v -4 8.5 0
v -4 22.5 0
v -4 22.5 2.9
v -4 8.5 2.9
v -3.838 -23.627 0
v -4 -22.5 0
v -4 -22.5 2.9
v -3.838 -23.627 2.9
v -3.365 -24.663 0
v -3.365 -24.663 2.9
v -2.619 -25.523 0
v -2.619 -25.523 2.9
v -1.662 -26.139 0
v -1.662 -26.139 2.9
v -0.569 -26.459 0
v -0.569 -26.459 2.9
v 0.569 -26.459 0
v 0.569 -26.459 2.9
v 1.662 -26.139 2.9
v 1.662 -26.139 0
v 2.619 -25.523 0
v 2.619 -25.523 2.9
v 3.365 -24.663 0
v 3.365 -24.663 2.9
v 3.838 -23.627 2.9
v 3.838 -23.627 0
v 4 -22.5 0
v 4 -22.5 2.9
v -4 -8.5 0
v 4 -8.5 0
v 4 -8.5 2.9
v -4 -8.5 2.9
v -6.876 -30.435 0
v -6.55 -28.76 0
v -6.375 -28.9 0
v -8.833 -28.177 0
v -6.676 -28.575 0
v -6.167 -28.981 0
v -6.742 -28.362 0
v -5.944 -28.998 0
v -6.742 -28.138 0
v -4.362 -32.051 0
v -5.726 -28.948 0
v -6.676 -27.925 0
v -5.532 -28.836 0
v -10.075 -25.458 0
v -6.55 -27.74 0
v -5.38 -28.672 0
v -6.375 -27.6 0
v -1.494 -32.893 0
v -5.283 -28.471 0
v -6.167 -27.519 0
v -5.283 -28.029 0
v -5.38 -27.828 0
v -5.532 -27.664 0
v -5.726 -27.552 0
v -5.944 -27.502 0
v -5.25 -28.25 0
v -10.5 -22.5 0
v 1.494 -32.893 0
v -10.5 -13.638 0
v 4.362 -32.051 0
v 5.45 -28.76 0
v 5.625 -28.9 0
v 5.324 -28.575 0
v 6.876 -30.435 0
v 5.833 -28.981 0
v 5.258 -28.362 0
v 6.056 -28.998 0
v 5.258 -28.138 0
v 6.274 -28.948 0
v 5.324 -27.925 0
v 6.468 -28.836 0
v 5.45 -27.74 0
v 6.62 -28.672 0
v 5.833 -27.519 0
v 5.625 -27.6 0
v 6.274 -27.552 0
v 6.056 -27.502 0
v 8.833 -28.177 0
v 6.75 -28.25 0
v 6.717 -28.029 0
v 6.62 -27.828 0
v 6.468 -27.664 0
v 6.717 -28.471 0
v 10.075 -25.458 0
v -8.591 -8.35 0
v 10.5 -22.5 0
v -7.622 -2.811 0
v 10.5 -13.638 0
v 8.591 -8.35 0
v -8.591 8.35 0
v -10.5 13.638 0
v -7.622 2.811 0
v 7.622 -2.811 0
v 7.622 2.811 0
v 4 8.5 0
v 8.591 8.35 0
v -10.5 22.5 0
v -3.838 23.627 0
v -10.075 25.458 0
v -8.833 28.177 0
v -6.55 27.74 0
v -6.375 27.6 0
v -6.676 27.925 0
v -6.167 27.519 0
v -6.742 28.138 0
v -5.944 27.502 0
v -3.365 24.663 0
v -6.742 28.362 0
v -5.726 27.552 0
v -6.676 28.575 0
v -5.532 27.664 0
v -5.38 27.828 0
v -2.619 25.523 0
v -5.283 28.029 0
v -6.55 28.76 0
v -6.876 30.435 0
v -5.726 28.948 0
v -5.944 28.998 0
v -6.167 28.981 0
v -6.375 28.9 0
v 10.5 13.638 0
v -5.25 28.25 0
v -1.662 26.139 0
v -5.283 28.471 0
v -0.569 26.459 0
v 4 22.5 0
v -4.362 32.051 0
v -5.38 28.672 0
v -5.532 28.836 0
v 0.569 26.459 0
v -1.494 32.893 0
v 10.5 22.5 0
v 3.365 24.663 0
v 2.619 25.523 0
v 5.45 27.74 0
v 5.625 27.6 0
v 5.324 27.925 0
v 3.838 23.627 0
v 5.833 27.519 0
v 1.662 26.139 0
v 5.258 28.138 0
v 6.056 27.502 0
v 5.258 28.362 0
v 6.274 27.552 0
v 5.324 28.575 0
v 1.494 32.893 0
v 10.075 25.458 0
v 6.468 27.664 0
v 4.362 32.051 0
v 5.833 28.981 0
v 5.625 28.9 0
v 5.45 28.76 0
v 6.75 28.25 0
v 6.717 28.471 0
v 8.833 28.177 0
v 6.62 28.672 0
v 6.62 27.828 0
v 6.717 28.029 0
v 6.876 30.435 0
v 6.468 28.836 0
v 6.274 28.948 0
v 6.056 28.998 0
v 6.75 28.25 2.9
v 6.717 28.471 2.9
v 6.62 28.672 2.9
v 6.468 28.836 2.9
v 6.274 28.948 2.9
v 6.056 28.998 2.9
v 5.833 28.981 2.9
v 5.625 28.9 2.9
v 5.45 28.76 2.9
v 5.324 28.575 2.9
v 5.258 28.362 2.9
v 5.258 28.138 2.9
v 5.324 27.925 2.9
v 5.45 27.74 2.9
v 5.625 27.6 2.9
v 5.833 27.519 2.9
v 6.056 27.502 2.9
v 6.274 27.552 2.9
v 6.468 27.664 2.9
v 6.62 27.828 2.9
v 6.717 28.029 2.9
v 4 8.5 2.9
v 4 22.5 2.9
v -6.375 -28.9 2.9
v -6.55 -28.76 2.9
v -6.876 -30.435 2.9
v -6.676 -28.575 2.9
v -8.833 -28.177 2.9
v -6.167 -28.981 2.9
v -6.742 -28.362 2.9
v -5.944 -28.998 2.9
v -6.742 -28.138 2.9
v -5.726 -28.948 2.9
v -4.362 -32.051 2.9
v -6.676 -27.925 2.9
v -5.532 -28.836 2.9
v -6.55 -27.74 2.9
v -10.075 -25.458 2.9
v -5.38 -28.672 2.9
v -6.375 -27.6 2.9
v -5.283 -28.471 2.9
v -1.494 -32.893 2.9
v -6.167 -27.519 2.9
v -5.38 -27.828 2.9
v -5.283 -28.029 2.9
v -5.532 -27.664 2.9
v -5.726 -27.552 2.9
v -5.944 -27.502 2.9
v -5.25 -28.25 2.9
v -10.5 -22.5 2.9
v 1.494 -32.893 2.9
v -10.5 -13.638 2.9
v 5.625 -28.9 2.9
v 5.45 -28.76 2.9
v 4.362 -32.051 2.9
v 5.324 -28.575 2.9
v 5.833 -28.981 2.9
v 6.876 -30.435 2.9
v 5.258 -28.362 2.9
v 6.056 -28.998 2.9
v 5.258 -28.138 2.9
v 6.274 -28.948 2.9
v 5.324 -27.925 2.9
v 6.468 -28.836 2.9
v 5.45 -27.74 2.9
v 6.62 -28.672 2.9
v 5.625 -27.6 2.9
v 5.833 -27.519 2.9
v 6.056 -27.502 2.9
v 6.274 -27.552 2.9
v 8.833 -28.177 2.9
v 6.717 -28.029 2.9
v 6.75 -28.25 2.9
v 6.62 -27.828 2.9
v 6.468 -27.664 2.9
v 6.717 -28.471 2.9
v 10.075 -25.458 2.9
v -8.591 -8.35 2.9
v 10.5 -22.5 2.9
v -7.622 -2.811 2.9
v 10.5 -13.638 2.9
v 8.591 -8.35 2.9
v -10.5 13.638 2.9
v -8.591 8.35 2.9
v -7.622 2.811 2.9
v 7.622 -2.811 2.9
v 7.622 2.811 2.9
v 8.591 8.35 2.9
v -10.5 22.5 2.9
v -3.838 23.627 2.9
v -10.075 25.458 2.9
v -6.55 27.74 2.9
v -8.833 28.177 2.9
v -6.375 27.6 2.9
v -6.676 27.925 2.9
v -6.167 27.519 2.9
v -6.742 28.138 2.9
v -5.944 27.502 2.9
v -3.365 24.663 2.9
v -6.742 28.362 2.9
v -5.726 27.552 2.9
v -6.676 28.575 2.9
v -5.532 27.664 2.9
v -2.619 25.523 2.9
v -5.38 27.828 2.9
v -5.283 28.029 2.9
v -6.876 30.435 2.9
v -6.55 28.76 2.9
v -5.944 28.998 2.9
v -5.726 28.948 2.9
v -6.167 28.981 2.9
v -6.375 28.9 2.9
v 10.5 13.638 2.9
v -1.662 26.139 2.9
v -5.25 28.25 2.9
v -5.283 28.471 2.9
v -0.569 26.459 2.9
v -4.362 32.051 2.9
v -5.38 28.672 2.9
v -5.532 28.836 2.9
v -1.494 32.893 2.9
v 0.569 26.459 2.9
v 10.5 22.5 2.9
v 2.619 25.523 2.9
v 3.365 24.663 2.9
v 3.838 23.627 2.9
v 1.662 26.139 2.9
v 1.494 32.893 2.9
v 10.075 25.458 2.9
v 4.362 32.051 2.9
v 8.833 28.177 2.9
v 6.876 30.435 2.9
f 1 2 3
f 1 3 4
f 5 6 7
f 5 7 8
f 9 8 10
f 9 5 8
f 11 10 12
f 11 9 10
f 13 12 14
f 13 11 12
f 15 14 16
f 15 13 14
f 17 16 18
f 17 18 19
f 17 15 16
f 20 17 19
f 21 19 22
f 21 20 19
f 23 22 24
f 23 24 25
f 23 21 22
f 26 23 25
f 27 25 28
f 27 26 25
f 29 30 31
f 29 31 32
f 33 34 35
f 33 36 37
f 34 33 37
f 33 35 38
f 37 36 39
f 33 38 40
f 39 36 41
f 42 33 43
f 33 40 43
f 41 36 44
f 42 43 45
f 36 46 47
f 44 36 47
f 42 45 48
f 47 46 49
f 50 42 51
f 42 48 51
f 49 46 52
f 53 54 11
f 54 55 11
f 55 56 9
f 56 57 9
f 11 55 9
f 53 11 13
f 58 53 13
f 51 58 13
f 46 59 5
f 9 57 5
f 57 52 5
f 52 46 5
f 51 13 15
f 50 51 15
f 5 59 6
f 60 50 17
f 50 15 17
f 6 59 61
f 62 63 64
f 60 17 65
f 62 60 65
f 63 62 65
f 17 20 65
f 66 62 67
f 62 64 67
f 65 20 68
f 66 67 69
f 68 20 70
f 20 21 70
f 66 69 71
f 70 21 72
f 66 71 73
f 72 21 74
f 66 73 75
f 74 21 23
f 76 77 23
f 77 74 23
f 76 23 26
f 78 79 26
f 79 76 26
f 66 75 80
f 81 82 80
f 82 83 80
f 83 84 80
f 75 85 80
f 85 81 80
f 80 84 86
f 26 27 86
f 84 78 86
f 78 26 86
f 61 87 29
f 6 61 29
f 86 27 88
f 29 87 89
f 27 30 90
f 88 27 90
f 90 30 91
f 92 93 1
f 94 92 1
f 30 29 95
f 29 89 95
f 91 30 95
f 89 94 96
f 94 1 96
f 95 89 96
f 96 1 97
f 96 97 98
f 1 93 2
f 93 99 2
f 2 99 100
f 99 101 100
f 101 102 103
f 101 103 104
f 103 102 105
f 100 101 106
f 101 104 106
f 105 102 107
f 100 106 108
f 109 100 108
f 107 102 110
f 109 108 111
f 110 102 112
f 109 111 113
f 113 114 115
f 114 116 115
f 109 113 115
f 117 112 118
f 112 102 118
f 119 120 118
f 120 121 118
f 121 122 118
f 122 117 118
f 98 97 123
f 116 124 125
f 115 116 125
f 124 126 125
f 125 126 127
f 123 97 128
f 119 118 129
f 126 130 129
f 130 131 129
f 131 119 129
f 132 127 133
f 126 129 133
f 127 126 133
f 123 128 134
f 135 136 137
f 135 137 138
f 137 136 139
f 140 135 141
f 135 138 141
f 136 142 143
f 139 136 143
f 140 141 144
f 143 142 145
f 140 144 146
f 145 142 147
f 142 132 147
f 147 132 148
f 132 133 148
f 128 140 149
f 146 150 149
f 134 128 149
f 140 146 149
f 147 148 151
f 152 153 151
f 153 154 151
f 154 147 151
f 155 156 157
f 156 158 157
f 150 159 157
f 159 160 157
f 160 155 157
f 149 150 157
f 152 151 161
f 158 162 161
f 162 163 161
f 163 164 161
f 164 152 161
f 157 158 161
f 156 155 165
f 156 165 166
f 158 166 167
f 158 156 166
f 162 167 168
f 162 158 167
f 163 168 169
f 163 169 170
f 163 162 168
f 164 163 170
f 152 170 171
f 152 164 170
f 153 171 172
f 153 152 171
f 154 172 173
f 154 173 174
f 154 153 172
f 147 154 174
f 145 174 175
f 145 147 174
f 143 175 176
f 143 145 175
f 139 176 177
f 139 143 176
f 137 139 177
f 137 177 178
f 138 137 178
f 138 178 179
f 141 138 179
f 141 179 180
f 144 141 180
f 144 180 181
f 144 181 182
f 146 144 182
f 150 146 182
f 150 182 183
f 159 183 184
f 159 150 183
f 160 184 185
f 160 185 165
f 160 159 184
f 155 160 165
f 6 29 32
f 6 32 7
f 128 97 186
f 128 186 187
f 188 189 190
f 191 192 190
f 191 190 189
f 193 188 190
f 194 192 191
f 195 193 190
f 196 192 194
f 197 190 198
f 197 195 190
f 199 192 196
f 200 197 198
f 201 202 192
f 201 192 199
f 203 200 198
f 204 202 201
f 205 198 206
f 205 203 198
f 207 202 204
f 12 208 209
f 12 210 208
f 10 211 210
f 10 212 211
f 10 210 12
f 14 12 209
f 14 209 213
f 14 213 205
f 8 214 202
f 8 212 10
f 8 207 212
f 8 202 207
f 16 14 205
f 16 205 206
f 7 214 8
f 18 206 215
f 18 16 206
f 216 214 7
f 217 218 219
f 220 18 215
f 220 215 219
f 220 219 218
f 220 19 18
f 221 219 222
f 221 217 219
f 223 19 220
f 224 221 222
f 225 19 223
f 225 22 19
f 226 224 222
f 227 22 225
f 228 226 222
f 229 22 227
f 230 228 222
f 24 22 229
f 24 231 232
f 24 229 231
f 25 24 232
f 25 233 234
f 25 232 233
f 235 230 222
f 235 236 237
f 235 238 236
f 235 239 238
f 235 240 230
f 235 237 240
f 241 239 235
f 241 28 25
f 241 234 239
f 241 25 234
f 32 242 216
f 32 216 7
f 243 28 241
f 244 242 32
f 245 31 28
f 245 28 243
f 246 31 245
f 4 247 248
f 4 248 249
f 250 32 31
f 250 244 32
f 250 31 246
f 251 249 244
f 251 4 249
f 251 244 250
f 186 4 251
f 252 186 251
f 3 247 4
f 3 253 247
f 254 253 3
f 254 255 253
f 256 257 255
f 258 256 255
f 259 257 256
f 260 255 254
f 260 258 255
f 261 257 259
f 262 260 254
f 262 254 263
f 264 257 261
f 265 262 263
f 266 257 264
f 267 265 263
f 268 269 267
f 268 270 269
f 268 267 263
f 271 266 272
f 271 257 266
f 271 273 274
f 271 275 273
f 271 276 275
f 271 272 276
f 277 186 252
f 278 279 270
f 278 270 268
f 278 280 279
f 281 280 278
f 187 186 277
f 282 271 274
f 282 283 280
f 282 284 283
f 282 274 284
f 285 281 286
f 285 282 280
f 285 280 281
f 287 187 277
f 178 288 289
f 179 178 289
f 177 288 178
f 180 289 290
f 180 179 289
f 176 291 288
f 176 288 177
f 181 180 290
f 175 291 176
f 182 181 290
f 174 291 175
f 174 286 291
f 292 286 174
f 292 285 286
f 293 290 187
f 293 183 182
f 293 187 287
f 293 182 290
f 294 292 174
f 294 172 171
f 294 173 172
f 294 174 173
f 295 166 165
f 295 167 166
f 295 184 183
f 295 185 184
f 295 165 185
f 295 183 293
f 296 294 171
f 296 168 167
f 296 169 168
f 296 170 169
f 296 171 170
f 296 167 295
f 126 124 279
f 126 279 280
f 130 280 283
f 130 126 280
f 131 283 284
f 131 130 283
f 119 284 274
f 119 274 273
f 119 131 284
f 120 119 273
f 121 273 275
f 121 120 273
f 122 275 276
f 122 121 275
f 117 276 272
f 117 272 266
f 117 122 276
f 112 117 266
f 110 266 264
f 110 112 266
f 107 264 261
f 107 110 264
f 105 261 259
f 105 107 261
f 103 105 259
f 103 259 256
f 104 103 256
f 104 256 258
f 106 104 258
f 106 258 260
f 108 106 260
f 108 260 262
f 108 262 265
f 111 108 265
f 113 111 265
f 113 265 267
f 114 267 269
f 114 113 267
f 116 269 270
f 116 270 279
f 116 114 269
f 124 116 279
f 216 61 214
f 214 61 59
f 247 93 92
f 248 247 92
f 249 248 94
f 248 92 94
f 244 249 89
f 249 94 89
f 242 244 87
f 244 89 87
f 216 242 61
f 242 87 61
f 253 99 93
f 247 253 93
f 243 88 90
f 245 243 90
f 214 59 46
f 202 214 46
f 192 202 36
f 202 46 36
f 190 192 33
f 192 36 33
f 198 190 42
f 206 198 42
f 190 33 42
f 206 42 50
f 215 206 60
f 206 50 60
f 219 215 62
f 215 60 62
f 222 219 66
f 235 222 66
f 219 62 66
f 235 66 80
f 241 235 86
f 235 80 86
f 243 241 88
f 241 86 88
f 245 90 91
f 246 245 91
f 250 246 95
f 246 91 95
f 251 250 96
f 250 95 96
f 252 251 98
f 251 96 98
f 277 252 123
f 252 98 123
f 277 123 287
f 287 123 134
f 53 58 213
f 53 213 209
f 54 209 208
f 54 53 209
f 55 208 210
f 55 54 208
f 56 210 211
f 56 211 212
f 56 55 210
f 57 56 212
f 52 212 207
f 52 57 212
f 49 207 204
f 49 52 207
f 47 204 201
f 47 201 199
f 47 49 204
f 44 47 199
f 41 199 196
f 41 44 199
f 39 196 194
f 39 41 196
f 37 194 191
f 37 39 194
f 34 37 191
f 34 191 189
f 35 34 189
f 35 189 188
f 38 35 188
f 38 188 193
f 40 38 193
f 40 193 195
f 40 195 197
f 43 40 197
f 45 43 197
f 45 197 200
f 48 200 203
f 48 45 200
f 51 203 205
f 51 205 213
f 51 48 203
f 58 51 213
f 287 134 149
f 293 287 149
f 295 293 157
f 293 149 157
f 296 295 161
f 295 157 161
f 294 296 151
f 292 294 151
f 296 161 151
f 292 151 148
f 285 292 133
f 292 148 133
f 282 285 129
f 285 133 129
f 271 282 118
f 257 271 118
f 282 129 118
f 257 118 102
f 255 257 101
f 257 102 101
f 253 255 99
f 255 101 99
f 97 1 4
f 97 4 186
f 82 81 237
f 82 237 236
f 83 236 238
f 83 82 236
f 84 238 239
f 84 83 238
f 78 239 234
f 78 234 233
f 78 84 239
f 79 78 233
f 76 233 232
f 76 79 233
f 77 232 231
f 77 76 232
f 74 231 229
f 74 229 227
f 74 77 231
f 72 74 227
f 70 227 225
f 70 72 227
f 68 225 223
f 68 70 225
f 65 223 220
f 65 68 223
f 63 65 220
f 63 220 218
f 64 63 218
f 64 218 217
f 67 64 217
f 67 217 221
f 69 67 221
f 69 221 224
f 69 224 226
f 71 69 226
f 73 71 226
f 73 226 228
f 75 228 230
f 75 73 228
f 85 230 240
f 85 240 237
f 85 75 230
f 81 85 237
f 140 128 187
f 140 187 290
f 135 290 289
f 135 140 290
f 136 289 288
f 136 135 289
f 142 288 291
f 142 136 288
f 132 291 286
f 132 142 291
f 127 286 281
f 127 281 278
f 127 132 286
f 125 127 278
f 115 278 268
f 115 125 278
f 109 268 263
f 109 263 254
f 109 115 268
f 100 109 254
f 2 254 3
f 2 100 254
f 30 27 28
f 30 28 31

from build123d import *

# Parameters (mm, degrees)
SKETCH_1_R      = 0.75
EXTRUDE_1_DEPTH = 2.9


with BuildPart() as part:
    # 草图1 → 凸台-拉伸1 (new body)
    with BuildSketch(Plane.XY):
        with BuildLine():
            Line((-10.5, 22.5), (-10.5, 13.638181697))
            ThreePointArc((-10.5, 13.638181697), (-7.5, 0), (-10.5, -13.638181697))
            Line((-10.5, -13.638181697), (-10.5, -22.5))
            ThreePointArc((-10.5, -22.5), (0, -33), (10.5, -22.5))
            Line((10.5, -22.5), (10.5, -13.638181697))
            ThreePointArc((10.5, -13.638181697), (7.5, 0), (10.5, 13.638181697))
            Line((10.5, 13.638181697), (10.5, 22.5))
            ThreePointArc((10.5, 22.5), (0, 33), (-10.5, 22.5))
        make_face()
        with Locations((6, 28.25)):
            Circle(SKETCH_1_R, mode=Mode.SUBTRACT)
        with Locations((-6, 28.25)):
            Circle(SKETCH_1_R, mode=Mode.SUBTRACT)
        with Locations((6, -28.25)):
            Circle(SKETCH_1_R, mode=Mode.SUBTRACT)
        with Locations((-6, -28.25)):
            Circle(SKETCH_1_R, mode=Mode.SUBTRACT)
        with BuildLine():
            ThreePointArc((4, 22.500000371), (-3.71e-07, 26.5), (-4, 22.499999629))
            Line((-4, 22.499999629), (-4, 8.5))
            Line((-4, 8.5), (4, 8.5))
            Line((4, 8.5), (4, 22.500000371))
        make_face(mode=Mode.SUBTRACT)
        with BuildLine():
            Line((4, -22.500000371), (4, -8.5))
            Line((4, -8.5), (-4, -8.5))
            Line((-4, -8.5), (-4, -22.499999629))
            ThreePointArc((-4, -22.499999629), (-3.71e-07, -26.5), (4, -22.500000371))
        make_face(mode=Mode.SUBTRACT)
    extrude(amount=EXTRUDE_1_DEPTH)


solid = part.part
